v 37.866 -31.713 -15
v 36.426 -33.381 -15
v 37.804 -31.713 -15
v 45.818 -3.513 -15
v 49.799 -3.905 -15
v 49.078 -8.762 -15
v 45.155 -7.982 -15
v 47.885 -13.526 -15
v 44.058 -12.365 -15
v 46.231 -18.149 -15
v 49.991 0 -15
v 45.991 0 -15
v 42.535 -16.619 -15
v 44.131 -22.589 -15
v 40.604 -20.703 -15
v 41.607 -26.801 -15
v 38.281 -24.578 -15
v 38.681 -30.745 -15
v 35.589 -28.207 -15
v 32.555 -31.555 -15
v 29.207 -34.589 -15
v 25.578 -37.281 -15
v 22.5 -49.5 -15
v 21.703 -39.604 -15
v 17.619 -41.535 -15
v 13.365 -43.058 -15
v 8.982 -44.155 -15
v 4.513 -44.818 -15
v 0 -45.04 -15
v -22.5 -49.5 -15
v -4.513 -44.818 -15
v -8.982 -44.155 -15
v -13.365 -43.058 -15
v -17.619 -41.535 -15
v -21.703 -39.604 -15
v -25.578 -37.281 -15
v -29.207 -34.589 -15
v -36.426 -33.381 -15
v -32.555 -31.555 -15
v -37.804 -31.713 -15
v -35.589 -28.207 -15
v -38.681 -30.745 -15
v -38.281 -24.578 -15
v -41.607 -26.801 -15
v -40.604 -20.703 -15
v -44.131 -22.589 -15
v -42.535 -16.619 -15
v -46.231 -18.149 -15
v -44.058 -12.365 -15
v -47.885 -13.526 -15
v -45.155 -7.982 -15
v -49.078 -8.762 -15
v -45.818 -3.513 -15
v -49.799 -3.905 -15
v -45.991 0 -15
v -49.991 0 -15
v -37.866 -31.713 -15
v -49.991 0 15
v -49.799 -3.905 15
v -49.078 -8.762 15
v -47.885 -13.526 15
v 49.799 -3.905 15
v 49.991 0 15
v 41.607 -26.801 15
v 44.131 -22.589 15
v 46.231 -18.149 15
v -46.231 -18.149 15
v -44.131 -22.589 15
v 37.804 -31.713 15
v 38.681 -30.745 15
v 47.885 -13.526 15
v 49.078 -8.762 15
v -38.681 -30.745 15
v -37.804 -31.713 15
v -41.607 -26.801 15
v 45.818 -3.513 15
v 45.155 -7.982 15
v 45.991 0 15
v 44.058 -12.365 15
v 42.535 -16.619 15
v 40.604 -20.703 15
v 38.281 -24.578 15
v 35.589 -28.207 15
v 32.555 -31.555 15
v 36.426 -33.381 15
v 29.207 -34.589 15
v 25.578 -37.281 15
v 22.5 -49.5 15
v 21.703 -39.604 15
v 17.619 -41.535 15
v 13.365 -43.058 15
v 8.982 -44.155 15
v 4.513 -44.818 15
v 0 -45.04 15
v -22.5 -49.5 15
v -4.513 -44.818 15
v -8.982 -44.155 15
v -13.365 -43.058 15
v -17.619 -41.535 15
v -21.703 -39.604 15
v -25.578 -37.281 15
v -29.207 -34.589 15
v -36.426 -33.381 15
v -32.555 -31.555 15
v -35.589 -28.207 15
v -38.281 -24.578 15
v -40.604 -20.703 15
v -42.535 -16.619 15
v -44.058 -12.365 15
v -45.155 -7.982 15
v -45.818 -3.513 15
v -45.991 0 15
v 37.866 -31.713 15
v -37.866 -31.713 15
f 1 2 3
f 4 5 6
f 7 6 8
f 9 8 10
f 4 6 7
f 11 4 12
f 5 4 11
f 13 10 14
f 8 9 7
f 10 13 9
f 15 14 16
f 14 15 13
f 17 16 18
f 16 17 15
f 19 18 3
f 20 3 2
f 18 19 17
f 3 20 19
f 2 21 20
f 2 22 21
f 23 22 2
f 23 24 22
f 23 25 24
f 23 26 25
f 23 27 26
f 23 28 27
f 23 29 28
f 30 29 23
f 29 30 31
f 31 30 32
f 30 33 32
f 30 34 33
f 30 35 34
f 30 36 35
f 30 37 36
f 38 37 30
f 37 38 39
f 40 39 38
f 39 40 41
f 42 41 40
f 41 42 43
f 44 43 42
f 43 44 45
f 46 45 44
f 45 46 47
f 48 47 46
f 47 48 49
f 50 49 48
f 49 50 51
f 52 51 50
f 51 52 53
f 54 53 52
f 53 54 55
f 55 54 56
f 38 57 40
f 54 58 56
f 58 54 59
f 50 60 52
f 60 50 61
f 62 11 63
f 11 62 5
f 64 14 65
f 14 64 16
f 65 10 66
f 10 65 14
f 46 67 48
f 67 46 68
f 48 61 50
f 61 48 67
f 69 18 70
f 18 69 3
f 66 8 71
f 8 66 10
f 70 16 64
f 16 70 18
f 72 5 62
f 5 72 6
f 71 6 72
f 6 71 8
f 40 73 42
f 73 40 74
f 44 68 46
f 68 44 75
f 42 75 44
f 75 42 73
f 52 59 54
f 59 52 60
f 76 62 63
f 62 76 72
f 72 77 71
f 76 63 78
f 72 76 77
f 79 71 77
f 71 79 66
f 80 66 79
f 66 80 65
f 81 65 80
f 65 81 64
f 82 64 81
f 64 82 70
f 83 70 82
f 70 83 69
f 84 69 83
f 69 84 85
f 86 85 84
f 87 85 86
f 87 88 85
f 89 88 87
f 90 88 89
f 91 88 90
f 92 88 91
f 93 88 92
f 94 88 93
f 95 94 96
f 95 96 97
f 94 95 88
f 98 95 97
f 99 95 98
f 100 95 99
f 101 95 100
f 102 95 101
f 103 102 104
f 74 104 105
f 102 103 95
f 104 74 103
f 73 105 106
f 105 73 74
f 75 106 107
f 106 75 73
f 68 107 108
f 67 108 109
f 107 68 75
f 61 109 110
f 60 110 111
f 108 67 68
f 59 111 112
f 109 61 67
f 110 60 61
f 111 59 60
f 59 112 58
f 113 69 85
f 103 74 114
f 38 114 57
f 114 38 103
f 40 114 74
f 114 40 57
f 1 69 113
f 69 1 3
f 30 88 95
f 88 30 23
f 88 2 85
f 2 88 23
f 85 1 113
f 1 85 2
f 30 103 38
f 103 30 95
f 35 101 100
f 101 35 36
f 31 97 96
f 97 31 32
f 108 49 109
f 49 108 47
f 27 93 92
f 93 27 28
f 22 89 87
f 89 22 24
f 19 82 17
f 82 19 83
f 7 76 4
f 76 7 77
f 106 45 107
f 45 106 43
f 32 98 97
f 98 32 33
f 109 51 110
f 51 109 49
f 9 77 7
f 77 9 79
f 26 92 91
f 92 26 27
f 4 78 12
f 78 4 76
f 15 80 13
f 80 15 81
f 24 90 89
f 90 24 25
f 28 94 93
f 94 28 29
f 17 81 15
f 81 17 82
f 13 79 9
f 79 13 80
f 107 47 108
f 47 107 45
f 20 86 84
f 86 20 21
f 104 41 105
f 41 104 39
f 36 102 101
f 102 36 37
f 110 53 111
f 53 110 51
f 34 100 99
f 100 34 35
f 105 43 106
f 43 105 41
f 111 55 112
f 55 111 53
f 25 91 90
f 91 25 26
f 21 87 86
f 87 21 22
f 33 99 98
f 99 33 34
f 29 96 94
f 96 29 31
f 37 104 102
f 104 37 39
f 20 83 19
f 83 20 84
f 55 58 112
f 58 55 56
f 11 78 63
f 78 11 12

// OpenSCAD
// Test code for creating a trapezoidal extrusion from the flat base to connect
// with the circular rim at a tangent.
//
// It turns out that the built-in hull() is much simpler, so this is just here
// because I did the math.
//
// Based on the WTE3-M-CLAMP-R1 model by Blue Robotics:
// https://bluerobotics.com/store/watertight-enclosures/enclosure-clamp/
//
// OpenSCAD model by Ryan Govostes.
// License: CC BY 4.0 (https://creativecommons.org/licenses/by/4.0/)


// Measurements based on the 75mm (3") series, WTE3-M-CLAMP-R1
radius = 46.04;
thickness = 4.00;
width = 115.60;
depth = 49.50;
height = 30.00;
base_width = 45.00;
circle_y_offset = 1.00;


// Geometry calculations for the extrusion of the base to meet the cylinder at
// a tangent.
//
// See https://stackoverflow.com/a/1351772 for an explanation.
R = radius + thickness;
D = sqrt(pow(base_width/2, 2) + pow(depth + circle_y_offset, 2));
L = sqrt(pow(D, 2) - pow(R, 2));
alpha = asin(R / D);
beta  = atan2(-(depth + circle_y_offset), base_width/2);
theta = 180 - (alpha - beta);
x = L * cos(theta);
y = L * sin(theta);


$fn = 64;


difference() {
    union() {
        translate([0, circle_y_offset, 0])
        cylinder(h=height, r=(radius + thickness), center=true);

        // Create a 2D base face and then extrude it to a create a trapezoid
        // that touches the rim at a tangent.
        translate([0, -depth, 0])
        rotate([90, 0, 180])
        linear_extrude(y, center=false,
                       scale=[(base_width + 2*x)/base_width, 1.0])
        square(size=[base_width, height], center=true);
    }

    // Subtract a cylinder from the center to leave a rim
    translate([0, circle_y_offset, 0])
    cylinder(h=height, r=radius, center=true);

    // Cut off the top half of the shape
    translate([-200, 0, -(height/2)])
    cube([400, 400, height]);
}
